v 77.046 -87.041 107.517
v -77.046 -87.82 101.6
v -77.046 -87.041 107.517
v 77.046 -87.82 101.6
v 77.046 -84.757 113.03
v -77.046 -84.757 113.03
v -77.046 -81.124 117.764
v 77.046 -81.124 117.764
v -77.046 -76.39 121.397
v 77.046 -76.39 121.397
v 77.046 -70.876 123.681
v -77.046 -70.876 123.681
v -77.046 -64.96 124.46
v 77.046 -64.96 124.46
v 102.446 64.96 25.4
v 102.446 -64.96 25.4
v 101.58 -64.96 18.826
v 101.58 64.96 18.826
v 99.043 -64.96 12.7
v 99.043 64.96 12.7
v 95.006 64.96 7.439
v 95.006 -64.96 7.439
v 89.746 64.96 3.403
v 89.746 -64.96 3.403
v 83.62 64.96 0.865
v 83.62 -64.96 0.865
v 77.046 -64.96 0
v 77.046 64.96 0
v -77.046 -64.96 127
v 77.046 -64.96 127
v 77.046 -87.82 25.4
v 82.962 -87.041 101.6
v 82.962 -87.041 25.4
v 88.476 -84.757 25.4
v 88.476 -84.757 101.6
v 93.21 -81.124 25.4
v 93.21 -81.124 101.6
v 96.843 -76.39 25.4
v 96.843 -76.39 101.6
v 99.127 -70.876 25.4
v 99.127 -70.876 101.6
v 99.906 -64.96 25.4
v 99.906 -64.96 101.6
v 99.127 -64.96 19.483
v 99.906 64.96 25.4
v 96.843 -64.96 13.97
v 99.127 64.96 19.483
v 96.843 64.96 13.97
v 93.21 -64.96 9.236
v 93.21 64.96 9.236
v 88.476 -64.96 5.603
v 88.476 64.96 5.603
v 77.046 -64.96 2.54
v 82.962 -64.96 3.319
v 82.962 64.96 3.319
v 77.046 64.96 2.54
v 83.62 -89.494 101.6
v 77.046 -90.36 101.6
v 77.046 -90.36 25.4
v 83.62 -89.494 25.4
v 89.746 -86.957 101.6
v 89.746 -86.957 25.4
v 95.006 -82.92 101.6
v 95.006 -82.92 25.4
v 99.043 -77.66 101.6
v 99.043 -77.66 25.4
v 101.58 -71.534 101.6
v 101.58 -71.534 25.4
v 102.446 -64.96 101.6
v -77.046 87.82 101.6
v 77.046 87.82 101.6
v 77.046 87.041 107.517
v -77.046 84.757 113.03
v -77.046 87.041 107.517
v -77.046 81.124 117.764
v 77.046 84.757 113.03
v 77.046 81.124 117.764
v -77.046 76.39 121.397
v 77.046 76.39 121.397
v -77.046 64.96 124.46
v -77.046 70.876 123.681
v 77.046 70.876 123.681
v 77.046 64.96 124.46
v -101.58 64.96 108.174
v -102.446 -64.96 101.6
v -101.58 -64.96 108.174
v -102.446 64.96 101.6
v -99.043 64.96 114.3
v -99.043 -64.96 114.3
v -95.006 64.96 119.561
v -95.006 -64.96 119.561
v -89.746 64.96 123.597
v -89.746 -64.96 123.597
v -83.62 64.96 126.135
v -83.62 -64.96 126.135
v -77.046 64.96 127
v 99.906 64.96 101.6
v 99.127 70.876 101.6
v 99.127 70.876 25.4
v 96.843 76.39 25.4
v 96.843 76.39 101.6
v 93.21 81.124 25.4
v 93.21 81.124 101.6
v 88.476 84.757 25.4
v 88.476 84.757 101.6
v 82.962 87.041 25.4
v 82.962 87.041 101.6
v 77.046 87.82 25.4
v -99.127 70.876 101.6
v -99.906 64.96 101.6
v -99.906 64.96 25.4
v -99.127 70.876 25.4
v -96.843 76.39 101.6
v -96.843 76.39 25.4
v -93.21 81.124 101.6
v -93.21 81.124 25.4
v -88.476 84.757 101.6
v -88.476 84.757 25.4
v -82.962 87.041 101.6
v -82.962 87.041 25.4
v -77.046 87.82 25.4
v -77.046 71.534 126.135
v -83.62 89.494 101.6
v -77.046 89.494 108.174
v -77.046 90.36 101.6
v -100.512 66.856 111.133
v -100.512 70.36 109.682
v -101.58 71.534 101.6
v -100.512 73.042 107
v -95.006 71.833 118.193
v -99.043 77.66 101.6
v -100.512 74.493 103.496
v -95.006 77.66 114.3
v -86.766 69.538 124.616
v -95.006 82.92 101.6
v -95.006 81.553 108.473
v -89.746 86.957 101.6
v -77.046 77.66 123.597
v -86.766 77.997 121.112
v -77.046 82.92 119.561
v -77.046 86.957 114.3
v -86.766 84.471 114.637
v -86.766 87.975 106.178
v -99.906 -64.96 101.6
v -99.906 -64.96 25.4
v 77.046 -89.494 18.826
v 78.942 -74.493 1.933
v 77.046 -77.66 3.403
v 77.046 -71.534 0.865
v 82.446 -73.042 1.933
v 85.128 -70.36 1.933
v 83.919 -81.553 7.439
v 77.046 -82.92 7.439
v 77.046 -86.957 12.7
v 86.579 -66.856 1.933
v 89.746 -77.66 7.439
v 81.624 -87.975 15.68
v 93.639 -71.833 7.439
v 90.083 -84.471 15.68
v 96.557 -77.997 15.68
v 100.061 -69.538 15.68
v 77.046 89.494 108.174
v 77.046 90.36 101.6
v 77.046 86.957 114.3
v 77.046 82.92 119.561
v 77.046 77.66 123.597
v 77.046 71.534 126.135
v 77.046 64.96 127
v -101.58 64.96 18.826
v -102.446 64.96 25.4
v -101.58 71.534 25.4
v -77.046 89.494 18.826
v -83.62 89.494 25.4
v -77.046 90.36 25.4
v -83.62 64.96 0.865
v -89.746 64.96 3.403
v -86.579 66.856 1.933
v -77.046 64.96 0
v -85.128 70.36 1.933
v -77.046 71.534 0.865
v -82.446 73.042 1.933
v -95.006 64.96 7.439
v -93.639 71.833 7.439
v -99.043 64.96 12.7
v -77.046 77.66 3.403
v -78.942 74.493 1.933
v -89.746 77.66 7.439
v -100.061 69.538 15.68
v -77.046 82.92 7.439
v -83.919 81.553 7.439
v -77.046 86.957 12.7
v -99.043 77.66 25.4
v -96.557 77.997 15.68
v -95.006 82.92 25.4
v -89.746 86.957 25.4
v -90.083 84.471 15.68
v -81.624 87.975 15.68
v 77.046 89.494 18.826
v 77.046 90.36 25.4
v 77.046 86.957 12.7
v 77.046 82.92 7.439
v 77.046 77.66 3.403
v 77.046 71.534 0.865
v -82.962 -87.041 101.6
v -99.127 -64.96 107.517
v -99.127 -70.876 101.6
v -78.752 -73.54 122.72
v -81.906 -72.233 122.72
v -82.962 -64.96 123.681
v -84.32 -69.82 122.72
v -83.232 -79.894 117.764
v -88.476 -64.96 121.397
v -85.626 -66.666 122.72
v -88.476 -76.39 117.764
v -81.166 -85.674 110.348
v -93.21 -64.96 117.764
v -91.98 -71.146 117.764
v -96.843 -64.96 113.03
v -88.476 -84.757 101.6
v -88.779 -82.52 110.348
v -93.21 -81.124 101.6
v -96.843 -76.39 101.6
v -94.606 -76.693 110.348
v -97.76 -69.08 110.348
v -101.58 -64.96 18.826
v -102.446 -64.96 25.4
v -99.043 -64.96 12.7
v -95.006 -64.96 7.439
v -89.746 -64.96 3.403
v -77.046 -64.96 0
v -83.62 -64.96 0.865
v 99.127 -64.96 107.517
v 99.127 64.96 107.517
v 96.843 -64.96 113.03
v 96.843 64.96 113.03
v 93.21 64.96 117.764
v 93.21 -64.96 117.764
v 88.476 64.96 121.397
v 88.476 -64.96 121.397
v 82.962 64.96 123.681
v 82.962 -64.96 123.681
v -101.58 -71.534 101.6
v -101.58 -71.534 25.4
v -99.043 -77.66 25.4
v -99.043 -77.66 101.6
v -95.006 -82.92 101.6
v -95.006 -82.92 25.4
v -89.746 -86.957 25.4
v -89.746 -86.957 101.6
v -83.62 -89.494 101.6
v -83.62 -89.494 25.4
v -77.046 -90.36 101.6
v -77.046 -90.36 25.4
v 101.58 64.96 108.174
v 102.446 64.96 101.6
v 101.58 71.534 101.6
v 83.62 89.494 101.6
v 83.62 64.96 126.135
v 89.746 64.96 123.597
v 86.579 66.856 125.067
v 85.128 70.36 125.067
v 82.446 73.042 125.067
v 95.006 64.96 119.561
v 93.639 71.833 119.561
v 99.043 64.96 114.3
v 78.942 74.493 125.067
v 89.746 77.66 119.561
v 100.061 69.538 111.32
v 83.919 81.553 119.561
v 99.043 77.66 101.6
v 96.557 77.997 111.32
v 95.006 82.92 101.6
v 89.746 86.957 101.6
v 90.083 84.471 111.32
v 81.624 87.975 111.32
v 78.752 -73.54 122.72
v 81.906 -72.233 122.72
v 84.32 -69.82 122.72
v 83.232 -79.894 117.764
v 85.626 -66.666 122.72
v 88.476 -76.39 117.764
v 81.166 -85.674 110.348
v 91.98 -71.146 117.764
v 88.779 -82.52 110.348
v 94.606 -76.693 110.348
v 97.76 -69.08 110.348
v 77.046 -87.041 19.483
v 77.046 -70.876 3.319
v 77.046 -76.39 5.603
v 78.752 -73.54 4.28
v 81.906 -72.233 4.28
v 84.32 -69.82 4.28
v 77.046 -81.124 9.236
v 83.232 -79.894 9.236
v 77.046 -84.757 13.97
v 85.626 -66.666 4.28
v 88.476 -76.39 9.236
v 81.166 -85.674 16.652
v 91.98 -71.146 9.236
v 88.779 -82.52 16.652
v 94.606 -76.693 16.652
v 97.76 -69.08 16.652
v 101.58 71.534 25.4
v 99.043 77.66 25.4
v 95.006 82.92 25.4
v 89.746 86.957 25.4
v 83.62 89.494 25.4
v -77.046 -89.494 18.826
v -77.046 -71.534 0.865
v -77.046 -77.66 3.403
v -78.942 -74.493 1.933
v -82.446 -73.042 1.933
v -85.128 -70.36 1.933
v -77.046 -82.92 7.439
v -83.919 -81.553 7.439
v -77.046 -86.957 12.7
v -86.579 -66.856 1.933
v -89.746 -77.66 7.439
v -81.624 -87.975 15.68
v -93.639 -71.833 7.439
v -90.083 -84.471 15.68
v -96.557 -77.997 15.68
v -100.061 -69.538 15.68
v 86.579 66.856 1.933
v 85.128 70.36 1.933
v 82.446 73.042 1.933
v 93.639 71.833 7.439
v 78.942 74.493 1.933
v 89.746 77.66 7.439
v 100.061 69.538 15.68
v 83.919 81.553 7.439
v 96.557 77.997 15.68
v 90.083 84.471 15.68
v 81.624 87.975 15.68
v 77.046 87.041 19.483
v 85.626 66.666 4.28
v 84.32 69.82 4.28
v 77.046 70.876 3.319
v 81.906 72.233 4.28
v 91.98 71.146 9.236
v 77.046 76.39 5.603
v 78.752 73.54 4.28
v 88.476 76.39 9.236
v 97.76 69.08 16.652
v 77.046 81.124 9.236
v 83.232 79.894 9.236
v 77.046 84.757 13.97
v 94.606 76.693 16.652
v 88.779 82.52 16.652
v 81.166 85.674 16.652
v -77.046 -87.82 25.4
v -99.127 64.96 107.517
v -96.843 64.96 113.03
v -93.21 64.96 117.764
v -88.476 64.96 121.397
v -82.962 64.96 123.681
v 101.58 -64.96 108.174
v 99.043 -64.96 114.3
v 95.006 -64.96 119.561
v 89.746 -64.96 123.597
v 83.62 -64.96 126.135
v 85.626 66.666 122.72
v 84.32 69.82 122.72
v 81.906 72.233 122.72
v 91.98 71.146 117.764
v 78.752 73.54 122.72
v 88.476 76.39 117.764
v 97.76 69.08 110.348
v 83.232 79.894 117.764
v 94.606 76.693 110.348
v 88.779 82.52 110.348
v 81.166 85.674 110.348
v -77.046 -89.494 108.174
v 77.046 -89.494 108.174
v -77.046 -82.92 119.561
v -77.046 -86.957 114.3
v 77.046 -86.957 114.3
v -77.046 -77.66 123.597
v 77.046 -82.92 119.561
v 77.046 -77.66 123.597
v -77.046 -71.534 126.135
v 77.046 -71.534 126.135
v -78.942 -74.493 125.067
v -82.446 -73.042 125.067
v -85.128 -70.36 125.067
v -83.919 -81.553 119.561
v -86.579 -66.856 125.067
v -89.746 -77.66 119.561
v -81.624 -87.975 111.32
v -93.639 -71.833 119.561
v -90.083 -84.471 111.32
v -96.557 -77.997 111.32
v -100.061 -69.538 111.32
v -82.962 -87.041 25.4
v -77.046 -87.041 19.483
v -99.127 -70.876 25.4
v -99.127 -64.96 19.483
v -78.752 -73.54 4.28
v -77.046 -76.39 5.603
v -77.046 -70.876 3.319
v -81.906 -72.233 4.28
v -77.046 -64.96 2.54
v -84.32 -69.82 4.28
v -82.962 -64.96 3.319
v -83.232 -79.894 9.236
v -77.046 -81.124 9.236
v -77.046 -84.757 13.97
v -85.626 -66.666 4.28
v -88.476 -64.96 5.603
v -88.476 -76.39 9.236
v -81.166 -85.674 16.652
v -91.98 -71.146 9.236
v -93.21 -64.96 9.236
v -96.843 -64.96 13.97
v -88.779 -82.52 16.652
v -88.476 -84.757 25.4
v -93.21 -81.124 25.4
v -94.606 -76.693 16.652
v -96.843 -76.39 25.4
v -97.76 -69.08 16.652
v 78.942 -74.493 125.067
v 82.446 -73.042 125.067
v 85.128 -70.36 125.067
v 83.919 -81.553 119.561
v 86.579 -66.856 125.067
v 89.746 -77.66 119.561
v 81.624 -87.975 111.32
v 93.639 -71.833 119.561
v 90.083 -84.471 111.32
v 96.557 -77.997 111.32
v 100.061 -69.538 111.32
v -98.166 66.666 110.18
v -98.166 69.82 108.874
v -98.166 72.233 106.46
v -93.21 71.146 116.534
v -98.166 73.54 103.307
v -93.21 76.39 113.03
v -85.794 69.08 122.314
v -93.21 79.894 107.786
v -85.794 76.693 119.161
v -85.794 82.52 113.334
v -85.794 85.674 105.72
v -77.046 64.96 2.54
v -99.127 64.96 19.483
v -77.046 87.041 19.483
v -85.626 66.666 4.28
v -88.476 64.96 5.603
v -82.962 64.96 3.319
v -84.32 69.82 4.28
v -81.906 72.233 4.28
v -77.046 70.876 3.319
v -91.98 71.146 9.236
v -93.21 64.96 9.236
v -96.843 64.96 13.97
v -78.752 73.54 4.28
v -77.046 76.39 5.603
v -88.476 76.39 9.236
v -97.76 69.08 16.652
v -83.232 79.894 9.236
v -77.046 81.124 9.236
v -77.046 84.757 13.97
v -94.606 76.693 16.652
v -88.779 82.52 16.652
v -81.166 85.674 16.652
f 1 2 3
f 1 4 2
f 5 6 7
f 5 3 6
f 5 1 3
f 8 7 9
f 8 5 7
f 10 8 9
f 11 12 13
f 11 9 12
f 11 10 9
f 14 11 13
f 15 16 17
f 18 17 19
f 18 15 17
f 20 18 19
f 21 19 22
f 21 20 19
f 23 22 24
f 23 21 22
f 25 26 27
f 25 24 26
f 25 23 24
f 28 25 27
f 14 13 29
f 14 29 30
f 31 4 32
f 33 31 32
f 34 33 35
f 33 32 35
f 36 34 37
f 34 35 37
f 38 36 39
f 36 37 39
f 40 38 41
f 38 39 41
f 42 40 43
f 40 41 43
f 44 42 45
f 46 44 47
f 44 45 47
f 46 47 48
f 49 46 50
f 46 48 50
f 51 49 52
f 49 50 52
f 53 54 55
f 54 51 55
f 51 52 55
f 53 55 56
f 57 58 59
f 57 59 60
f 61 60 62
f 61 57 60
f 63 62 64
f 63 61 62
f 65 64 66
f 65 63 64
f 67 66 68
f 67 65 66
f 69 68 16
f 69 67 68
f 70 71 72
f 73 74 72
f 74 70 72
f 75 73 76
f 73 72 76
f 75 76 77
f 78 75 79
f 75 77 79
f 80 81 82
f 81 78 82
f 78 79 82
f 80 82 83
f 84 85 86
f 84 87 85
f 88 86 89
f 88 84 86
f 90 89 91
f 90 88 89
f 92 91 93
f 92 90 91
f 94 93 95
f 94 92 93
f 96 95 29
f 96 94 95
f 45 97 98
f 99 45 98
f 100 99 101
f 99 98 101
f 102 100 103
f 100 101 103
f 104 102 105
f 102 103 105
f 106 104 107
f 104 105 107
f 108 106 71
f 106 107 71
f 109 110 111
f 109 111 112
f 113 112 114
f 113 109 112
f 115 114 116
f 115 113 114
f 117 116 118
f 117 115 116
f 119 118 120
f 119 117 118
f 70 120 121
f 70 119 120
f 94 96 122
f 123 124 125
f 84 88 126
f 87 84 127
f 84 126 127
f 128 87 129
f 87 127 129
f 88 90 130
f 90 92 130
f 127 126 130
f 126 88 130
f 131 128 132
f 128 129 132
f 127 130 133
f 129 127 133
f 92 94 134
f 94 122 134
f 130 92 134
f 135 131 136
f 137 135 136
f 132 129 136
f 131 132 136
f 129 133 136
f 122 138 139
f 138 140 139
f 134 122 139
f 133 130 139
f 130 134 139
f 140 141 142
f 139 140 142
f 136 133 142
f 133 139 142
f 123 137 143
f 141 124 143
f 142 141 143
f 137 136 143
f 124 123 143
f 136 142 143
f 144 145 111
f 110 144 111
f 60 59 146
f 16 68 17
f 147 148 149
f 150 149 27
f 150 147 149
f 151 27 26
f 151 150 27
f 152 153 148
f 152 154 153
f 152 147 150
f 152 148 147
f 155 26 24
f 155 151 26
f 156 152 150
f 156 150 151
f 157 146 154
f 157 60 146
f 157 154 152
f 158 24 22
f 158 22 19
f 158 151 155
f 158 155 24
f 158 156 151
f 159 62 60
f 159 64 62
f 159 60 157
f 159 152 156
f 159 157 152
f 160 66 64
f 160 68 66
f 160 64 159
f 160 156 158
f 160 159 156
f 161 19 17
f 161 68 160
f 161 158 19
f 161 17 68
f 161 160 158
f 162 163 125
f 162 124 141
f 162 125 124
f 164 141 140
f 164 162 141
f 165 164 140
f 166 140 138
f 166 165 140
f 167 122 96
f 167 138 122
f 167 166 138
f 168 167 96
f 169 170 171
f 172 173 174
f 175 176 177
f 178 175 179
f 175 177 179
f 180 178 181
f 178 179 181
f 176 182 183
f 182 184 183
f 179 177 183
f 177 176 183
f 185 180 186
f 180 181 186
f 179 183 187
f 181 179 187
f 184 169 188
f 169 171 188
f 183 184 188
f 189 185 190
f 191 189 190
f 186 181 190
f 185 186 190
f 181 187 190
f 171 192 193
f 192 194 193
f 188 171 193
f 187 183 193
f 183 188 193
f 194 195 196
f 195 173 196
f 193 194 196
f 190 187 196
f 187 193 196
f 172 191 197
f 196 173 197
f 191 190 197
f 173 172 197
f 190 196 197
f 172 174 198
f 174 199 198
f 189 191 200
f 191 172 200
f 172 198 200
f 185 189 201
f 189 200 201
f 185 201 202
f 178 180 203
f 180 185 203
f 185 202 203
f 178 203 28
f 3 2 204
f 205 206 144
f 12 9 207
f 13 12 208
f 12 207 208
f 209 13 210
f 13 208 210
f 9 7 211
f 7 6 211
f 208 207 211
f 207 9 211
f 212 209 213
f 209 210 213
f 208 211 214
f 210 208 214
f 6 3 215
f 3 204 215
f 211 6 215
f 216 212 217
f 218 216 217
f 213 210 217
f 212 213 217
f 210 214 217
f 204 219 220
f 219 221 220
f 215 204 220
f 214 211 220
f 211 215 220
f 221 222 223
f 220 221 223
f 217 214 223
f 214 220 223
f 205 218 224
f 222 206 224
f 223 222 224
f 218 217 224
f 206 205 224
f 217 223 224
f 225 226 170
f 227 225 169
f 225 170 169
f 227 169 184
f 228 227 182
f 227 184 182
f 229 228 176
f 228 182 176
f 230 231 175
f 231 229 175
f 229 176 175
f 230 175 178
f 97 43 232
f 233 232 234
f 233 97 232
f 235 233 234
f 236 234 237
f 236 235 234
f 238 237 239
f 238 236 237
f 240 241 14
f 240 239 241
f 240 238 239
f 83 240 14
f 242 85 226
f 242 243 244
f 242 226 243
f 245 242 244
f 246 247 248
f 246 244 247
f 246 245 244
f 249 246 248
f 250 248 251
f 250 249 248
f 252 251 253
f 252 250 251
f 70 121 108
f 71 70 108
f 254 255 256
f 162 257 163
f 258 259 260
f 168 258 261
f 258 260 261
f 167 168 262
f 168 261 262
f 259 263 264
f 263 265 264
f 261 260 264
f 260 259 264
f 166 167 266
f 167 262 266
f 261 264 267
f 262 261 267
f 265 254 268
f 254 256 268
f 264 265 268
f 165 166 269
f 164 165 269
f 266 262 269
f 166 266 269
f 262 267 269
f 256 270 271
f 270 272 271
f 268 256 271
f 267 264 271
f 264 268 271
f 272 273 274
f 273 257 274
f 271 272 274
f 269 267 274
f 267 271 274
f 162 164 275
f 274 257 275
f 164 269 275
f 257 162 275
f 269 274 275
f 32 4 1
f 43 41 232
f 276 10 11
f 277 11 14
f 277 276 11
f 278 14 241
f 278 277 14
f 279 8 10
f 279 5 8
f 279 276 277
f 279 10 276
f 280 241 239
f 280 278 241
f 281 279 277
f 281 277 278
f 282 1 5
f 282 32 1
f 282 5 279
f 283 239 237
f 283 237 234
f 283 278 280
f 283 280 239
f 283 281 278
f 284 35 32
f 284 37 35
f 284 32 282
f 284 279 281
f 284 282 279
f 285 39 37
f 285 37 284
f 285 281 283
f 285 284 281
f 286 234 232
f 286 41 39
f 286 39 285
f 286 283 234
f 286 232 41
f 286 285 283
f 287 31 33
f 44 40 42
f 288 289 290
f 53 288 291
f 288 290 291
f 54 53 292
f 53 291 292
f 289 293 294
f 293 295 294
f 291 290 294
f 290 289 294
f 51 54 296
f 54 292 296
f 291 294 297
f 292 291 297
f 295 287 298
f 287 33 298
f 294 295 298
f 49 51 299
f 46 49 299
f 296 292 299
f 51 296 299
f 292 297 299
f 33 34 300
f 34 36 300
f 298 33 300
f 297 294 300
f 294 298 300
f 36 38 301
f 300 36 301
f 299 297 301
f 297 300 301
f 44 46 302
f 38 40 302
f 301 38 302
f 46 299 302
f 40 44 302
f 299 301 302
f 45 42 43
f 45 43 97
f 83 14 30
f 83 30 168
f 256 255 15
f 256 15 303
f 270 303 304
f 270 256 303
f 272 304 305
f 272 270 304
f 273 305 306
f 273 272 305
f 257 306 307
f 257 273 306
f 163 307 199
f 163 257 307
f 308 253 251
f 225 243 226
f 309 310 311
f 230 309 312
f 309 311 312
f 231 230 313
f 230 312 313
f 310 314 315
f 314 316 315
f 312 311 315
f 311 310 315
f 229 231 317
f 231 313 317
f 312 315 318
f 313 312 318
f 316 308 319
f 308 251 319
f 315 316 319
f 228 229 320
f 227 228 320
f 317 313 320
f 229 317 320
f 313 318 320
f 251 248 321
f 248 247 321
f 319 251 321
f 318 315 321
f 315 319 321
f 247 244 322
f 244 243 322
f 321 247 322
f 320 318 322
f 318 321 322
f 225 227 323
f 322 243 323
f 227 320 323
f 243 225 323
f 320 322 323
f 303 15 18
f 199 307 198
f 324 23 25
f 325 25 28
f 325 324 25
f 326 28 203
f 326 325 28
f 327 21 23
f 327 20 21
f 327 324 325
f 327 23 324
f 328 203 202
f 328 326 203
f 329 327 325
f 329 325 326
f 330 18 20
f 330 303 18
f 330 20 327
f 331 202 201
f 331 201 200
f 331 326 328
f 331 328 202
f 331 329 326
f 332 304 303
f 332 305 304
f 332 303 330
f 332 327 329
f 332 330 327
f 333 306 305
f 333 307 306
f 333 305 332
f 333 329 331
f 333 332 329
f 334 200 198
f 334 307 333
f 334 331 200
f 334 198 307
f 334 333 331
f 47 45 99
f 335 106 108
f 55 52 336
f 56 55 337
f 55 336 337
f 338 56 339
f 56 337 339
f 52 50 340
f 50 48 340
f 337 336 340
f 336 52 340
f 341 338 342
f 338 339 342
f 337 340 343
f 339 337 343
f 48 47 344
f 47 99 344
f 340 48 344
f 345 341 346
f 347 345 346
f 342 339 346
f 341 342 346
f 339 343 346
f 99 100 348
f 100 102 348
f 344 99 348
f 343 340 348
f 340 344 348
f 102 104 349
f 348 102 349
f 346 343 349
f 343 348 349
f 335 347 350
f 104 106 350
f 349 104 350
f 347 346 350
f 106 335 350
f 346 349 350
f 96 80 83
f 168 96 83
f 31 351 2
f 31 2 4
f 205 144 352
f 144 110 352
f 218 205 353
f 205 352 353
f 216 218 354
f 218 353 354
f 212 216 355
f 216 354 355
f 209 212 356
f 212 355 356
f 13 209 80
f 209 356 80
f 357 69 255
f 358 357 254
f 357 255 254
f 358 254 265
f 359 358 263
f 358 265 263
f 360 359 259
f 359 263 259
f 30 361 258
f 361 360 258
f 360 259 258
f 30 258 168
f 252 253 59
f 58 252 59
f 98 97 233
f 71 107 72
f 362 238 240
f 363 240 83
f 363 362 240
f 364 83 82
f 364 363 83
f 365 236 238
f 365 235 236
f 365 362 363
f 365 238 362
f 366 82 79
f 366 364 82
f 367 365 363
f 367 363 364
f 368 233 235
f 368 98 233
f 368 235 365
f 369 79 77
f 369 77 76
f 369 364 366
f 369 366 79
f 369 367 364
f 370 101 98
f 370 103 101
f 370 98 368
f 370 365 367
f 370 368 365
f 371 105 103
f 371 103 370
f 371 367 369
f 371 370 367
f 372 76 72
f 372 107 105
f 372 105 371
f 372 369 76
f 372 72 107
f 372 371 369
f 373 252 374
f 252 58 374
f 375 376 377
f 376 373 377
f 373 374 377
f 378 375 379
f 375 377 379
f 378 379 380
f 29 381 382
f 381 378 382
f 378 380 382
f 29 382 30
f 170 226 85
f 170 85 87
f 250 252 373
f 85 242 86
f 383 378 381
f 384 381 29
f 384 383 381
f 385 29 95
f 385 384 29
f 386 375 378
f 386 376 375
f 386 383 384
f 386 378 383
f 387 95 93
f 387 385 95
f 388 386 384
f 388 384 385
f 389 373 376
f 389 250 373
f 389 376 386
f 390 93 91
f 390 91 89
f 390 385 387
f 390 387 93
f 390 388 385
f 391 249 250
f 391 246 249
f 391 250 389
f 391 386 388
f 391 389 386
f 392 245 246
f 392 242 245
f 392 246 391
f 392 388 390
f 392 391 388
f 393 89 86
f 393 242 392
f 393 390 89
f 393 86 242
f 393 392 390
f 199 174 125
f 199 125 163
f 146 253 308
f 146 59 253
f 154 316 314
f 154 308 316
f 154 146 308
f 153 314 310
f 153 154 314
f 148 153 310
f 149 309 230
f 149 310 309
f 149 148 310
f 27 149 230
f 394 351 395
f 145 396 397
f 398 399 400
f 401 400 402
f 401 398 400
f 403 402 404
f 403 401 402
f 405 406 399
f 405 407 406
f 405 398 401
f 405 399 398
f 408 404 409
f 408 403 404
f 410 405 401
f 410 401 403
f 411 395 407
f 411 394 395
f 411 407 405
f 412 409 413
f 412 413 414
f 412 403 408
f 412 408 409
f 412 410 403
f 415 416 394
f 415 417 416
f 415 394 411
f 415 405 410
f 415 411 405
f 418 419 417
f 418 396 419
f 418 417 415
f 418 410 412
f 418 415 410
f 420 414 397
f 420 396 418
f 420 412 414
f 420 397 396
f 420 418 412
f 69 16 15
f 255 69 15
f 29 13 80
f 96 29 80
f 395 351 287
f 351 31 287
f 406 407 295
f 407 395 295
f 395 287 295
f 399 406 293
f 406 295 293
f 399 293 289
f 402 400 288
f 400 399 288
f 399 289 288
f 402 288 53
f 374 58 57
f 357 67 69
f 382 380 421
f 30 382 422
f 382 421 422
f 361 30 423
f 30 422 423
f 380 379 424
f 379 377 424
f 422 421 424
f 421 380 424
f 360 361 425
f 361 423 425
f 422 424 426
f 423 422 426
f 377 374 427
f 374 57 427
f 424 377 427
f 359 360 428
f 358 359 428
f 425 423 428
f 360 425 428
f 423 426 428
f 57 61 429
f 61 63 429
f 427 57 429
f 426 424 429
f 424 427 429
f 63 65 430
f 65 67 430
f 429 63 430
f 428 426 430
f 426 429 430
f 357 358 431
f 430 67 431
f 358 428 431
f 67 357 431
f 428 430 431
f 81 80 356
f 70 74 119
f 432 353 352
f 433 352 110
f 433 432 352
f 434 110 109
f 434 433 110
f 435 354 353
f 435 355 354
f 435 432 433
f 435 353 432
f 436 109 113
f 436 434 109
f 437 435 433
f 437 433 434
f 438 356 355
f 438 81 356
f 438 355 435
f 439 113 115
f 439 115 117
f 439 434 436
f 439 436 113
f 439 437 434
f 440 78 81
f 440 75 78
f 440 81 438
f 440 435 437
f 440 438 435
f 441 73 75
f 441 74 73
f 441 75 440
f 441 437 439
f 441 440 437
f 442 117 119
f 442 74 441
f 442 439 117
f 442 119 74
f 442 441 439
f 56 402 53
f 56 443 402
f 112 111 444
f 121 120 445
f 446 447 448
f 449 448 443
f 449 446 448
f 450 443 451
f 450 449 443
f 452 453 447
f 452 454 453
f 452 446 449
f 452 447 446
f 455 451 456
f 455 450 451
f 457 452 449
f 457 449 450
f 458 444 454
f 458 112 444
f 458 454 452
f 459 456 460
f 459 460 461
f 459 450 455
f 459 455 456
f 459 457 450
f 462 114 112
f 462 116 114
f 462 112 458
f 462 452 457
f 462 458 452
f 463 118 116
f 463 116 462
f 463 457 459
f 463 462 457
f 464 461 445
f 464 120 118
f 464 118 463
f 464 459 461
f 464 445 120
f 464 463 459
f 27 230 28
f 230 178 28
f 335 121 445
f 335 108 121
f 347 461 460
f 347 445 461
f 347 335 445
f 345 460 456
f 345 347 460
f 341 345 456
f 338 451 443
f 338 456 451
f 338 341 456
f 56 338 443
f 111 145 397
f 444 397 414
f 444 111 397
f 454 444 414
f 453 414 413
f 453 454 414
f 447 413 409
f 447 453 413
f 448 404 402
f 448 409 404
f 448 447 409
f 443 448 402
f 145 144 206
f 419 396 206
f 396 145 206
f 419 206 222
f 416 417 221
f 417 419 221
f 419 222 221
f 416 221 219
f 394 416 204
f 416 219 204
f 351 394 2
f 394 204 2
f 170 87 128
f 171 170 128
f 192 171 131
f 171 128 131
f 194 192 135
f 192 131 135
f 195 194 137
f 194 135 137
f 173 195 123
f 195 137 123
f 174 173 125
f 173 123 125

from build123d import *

# Parameters (mm, degrees)
F0_W     = 204.8915475607
F0_H     = 180.7192862034
F1_DEPTH = 127
F2_R     = 25.4
F3_T     = -2.54


# Not quite as in the source:
# - a shell that OpenCascade refuses in one call is made with other operations: the cavity is built on its own and cut out


with BuildPart() as f1:
    # F0 (on Top) → F1 (new body)
    with BuildSketch(Plane.XY):
        Rectangle(F0_W, F0_H)
    extrude(amount=F1_DEPTH)

    # F2
    f2_edges = [f1.edges().sort_by_distance(p)[0] for p in [
        (-102.445774, -90.359643, 63.5),
        (102.445774, -90.359643, 63.5),
        (0, -90.359643, 0),
        (0, -90.359643, 127),
        (102.445774, 90.359643, 63.5),
        (102.445774, 0, 0),
        (102.445774, 0, 127),
        (0, 90.359643, 127),
        (-102.445774, 0, 127),
        (-102.445774, 90.359643, 63.5),
        (-102.445774, 0, 0),
        (0, 90.359643, 0),
    ]]
    fillet(f2_edges, radius=F2_R)

    # F3: a shell. OpenCascade refuses it in one call, so the cavity is built on its own and cut out:
    # the body offset inwards by the wall thickness, plus a prism from it out through each open face.
    f3_core = offset(f1.part, amount=F3_T, mode=Mode.PRIVATE)
    f3_exits = [f3_core.faces().sort_by_distance(p)[0] for p in [
        (0, 0, 124.46),
    ]]
    add(f3_core, mode=Mode.SUBTRACT)
    extrude(f3_exits, amount=-F3_T, mode=Mode.SUBTRACT)


solid = f1.part
